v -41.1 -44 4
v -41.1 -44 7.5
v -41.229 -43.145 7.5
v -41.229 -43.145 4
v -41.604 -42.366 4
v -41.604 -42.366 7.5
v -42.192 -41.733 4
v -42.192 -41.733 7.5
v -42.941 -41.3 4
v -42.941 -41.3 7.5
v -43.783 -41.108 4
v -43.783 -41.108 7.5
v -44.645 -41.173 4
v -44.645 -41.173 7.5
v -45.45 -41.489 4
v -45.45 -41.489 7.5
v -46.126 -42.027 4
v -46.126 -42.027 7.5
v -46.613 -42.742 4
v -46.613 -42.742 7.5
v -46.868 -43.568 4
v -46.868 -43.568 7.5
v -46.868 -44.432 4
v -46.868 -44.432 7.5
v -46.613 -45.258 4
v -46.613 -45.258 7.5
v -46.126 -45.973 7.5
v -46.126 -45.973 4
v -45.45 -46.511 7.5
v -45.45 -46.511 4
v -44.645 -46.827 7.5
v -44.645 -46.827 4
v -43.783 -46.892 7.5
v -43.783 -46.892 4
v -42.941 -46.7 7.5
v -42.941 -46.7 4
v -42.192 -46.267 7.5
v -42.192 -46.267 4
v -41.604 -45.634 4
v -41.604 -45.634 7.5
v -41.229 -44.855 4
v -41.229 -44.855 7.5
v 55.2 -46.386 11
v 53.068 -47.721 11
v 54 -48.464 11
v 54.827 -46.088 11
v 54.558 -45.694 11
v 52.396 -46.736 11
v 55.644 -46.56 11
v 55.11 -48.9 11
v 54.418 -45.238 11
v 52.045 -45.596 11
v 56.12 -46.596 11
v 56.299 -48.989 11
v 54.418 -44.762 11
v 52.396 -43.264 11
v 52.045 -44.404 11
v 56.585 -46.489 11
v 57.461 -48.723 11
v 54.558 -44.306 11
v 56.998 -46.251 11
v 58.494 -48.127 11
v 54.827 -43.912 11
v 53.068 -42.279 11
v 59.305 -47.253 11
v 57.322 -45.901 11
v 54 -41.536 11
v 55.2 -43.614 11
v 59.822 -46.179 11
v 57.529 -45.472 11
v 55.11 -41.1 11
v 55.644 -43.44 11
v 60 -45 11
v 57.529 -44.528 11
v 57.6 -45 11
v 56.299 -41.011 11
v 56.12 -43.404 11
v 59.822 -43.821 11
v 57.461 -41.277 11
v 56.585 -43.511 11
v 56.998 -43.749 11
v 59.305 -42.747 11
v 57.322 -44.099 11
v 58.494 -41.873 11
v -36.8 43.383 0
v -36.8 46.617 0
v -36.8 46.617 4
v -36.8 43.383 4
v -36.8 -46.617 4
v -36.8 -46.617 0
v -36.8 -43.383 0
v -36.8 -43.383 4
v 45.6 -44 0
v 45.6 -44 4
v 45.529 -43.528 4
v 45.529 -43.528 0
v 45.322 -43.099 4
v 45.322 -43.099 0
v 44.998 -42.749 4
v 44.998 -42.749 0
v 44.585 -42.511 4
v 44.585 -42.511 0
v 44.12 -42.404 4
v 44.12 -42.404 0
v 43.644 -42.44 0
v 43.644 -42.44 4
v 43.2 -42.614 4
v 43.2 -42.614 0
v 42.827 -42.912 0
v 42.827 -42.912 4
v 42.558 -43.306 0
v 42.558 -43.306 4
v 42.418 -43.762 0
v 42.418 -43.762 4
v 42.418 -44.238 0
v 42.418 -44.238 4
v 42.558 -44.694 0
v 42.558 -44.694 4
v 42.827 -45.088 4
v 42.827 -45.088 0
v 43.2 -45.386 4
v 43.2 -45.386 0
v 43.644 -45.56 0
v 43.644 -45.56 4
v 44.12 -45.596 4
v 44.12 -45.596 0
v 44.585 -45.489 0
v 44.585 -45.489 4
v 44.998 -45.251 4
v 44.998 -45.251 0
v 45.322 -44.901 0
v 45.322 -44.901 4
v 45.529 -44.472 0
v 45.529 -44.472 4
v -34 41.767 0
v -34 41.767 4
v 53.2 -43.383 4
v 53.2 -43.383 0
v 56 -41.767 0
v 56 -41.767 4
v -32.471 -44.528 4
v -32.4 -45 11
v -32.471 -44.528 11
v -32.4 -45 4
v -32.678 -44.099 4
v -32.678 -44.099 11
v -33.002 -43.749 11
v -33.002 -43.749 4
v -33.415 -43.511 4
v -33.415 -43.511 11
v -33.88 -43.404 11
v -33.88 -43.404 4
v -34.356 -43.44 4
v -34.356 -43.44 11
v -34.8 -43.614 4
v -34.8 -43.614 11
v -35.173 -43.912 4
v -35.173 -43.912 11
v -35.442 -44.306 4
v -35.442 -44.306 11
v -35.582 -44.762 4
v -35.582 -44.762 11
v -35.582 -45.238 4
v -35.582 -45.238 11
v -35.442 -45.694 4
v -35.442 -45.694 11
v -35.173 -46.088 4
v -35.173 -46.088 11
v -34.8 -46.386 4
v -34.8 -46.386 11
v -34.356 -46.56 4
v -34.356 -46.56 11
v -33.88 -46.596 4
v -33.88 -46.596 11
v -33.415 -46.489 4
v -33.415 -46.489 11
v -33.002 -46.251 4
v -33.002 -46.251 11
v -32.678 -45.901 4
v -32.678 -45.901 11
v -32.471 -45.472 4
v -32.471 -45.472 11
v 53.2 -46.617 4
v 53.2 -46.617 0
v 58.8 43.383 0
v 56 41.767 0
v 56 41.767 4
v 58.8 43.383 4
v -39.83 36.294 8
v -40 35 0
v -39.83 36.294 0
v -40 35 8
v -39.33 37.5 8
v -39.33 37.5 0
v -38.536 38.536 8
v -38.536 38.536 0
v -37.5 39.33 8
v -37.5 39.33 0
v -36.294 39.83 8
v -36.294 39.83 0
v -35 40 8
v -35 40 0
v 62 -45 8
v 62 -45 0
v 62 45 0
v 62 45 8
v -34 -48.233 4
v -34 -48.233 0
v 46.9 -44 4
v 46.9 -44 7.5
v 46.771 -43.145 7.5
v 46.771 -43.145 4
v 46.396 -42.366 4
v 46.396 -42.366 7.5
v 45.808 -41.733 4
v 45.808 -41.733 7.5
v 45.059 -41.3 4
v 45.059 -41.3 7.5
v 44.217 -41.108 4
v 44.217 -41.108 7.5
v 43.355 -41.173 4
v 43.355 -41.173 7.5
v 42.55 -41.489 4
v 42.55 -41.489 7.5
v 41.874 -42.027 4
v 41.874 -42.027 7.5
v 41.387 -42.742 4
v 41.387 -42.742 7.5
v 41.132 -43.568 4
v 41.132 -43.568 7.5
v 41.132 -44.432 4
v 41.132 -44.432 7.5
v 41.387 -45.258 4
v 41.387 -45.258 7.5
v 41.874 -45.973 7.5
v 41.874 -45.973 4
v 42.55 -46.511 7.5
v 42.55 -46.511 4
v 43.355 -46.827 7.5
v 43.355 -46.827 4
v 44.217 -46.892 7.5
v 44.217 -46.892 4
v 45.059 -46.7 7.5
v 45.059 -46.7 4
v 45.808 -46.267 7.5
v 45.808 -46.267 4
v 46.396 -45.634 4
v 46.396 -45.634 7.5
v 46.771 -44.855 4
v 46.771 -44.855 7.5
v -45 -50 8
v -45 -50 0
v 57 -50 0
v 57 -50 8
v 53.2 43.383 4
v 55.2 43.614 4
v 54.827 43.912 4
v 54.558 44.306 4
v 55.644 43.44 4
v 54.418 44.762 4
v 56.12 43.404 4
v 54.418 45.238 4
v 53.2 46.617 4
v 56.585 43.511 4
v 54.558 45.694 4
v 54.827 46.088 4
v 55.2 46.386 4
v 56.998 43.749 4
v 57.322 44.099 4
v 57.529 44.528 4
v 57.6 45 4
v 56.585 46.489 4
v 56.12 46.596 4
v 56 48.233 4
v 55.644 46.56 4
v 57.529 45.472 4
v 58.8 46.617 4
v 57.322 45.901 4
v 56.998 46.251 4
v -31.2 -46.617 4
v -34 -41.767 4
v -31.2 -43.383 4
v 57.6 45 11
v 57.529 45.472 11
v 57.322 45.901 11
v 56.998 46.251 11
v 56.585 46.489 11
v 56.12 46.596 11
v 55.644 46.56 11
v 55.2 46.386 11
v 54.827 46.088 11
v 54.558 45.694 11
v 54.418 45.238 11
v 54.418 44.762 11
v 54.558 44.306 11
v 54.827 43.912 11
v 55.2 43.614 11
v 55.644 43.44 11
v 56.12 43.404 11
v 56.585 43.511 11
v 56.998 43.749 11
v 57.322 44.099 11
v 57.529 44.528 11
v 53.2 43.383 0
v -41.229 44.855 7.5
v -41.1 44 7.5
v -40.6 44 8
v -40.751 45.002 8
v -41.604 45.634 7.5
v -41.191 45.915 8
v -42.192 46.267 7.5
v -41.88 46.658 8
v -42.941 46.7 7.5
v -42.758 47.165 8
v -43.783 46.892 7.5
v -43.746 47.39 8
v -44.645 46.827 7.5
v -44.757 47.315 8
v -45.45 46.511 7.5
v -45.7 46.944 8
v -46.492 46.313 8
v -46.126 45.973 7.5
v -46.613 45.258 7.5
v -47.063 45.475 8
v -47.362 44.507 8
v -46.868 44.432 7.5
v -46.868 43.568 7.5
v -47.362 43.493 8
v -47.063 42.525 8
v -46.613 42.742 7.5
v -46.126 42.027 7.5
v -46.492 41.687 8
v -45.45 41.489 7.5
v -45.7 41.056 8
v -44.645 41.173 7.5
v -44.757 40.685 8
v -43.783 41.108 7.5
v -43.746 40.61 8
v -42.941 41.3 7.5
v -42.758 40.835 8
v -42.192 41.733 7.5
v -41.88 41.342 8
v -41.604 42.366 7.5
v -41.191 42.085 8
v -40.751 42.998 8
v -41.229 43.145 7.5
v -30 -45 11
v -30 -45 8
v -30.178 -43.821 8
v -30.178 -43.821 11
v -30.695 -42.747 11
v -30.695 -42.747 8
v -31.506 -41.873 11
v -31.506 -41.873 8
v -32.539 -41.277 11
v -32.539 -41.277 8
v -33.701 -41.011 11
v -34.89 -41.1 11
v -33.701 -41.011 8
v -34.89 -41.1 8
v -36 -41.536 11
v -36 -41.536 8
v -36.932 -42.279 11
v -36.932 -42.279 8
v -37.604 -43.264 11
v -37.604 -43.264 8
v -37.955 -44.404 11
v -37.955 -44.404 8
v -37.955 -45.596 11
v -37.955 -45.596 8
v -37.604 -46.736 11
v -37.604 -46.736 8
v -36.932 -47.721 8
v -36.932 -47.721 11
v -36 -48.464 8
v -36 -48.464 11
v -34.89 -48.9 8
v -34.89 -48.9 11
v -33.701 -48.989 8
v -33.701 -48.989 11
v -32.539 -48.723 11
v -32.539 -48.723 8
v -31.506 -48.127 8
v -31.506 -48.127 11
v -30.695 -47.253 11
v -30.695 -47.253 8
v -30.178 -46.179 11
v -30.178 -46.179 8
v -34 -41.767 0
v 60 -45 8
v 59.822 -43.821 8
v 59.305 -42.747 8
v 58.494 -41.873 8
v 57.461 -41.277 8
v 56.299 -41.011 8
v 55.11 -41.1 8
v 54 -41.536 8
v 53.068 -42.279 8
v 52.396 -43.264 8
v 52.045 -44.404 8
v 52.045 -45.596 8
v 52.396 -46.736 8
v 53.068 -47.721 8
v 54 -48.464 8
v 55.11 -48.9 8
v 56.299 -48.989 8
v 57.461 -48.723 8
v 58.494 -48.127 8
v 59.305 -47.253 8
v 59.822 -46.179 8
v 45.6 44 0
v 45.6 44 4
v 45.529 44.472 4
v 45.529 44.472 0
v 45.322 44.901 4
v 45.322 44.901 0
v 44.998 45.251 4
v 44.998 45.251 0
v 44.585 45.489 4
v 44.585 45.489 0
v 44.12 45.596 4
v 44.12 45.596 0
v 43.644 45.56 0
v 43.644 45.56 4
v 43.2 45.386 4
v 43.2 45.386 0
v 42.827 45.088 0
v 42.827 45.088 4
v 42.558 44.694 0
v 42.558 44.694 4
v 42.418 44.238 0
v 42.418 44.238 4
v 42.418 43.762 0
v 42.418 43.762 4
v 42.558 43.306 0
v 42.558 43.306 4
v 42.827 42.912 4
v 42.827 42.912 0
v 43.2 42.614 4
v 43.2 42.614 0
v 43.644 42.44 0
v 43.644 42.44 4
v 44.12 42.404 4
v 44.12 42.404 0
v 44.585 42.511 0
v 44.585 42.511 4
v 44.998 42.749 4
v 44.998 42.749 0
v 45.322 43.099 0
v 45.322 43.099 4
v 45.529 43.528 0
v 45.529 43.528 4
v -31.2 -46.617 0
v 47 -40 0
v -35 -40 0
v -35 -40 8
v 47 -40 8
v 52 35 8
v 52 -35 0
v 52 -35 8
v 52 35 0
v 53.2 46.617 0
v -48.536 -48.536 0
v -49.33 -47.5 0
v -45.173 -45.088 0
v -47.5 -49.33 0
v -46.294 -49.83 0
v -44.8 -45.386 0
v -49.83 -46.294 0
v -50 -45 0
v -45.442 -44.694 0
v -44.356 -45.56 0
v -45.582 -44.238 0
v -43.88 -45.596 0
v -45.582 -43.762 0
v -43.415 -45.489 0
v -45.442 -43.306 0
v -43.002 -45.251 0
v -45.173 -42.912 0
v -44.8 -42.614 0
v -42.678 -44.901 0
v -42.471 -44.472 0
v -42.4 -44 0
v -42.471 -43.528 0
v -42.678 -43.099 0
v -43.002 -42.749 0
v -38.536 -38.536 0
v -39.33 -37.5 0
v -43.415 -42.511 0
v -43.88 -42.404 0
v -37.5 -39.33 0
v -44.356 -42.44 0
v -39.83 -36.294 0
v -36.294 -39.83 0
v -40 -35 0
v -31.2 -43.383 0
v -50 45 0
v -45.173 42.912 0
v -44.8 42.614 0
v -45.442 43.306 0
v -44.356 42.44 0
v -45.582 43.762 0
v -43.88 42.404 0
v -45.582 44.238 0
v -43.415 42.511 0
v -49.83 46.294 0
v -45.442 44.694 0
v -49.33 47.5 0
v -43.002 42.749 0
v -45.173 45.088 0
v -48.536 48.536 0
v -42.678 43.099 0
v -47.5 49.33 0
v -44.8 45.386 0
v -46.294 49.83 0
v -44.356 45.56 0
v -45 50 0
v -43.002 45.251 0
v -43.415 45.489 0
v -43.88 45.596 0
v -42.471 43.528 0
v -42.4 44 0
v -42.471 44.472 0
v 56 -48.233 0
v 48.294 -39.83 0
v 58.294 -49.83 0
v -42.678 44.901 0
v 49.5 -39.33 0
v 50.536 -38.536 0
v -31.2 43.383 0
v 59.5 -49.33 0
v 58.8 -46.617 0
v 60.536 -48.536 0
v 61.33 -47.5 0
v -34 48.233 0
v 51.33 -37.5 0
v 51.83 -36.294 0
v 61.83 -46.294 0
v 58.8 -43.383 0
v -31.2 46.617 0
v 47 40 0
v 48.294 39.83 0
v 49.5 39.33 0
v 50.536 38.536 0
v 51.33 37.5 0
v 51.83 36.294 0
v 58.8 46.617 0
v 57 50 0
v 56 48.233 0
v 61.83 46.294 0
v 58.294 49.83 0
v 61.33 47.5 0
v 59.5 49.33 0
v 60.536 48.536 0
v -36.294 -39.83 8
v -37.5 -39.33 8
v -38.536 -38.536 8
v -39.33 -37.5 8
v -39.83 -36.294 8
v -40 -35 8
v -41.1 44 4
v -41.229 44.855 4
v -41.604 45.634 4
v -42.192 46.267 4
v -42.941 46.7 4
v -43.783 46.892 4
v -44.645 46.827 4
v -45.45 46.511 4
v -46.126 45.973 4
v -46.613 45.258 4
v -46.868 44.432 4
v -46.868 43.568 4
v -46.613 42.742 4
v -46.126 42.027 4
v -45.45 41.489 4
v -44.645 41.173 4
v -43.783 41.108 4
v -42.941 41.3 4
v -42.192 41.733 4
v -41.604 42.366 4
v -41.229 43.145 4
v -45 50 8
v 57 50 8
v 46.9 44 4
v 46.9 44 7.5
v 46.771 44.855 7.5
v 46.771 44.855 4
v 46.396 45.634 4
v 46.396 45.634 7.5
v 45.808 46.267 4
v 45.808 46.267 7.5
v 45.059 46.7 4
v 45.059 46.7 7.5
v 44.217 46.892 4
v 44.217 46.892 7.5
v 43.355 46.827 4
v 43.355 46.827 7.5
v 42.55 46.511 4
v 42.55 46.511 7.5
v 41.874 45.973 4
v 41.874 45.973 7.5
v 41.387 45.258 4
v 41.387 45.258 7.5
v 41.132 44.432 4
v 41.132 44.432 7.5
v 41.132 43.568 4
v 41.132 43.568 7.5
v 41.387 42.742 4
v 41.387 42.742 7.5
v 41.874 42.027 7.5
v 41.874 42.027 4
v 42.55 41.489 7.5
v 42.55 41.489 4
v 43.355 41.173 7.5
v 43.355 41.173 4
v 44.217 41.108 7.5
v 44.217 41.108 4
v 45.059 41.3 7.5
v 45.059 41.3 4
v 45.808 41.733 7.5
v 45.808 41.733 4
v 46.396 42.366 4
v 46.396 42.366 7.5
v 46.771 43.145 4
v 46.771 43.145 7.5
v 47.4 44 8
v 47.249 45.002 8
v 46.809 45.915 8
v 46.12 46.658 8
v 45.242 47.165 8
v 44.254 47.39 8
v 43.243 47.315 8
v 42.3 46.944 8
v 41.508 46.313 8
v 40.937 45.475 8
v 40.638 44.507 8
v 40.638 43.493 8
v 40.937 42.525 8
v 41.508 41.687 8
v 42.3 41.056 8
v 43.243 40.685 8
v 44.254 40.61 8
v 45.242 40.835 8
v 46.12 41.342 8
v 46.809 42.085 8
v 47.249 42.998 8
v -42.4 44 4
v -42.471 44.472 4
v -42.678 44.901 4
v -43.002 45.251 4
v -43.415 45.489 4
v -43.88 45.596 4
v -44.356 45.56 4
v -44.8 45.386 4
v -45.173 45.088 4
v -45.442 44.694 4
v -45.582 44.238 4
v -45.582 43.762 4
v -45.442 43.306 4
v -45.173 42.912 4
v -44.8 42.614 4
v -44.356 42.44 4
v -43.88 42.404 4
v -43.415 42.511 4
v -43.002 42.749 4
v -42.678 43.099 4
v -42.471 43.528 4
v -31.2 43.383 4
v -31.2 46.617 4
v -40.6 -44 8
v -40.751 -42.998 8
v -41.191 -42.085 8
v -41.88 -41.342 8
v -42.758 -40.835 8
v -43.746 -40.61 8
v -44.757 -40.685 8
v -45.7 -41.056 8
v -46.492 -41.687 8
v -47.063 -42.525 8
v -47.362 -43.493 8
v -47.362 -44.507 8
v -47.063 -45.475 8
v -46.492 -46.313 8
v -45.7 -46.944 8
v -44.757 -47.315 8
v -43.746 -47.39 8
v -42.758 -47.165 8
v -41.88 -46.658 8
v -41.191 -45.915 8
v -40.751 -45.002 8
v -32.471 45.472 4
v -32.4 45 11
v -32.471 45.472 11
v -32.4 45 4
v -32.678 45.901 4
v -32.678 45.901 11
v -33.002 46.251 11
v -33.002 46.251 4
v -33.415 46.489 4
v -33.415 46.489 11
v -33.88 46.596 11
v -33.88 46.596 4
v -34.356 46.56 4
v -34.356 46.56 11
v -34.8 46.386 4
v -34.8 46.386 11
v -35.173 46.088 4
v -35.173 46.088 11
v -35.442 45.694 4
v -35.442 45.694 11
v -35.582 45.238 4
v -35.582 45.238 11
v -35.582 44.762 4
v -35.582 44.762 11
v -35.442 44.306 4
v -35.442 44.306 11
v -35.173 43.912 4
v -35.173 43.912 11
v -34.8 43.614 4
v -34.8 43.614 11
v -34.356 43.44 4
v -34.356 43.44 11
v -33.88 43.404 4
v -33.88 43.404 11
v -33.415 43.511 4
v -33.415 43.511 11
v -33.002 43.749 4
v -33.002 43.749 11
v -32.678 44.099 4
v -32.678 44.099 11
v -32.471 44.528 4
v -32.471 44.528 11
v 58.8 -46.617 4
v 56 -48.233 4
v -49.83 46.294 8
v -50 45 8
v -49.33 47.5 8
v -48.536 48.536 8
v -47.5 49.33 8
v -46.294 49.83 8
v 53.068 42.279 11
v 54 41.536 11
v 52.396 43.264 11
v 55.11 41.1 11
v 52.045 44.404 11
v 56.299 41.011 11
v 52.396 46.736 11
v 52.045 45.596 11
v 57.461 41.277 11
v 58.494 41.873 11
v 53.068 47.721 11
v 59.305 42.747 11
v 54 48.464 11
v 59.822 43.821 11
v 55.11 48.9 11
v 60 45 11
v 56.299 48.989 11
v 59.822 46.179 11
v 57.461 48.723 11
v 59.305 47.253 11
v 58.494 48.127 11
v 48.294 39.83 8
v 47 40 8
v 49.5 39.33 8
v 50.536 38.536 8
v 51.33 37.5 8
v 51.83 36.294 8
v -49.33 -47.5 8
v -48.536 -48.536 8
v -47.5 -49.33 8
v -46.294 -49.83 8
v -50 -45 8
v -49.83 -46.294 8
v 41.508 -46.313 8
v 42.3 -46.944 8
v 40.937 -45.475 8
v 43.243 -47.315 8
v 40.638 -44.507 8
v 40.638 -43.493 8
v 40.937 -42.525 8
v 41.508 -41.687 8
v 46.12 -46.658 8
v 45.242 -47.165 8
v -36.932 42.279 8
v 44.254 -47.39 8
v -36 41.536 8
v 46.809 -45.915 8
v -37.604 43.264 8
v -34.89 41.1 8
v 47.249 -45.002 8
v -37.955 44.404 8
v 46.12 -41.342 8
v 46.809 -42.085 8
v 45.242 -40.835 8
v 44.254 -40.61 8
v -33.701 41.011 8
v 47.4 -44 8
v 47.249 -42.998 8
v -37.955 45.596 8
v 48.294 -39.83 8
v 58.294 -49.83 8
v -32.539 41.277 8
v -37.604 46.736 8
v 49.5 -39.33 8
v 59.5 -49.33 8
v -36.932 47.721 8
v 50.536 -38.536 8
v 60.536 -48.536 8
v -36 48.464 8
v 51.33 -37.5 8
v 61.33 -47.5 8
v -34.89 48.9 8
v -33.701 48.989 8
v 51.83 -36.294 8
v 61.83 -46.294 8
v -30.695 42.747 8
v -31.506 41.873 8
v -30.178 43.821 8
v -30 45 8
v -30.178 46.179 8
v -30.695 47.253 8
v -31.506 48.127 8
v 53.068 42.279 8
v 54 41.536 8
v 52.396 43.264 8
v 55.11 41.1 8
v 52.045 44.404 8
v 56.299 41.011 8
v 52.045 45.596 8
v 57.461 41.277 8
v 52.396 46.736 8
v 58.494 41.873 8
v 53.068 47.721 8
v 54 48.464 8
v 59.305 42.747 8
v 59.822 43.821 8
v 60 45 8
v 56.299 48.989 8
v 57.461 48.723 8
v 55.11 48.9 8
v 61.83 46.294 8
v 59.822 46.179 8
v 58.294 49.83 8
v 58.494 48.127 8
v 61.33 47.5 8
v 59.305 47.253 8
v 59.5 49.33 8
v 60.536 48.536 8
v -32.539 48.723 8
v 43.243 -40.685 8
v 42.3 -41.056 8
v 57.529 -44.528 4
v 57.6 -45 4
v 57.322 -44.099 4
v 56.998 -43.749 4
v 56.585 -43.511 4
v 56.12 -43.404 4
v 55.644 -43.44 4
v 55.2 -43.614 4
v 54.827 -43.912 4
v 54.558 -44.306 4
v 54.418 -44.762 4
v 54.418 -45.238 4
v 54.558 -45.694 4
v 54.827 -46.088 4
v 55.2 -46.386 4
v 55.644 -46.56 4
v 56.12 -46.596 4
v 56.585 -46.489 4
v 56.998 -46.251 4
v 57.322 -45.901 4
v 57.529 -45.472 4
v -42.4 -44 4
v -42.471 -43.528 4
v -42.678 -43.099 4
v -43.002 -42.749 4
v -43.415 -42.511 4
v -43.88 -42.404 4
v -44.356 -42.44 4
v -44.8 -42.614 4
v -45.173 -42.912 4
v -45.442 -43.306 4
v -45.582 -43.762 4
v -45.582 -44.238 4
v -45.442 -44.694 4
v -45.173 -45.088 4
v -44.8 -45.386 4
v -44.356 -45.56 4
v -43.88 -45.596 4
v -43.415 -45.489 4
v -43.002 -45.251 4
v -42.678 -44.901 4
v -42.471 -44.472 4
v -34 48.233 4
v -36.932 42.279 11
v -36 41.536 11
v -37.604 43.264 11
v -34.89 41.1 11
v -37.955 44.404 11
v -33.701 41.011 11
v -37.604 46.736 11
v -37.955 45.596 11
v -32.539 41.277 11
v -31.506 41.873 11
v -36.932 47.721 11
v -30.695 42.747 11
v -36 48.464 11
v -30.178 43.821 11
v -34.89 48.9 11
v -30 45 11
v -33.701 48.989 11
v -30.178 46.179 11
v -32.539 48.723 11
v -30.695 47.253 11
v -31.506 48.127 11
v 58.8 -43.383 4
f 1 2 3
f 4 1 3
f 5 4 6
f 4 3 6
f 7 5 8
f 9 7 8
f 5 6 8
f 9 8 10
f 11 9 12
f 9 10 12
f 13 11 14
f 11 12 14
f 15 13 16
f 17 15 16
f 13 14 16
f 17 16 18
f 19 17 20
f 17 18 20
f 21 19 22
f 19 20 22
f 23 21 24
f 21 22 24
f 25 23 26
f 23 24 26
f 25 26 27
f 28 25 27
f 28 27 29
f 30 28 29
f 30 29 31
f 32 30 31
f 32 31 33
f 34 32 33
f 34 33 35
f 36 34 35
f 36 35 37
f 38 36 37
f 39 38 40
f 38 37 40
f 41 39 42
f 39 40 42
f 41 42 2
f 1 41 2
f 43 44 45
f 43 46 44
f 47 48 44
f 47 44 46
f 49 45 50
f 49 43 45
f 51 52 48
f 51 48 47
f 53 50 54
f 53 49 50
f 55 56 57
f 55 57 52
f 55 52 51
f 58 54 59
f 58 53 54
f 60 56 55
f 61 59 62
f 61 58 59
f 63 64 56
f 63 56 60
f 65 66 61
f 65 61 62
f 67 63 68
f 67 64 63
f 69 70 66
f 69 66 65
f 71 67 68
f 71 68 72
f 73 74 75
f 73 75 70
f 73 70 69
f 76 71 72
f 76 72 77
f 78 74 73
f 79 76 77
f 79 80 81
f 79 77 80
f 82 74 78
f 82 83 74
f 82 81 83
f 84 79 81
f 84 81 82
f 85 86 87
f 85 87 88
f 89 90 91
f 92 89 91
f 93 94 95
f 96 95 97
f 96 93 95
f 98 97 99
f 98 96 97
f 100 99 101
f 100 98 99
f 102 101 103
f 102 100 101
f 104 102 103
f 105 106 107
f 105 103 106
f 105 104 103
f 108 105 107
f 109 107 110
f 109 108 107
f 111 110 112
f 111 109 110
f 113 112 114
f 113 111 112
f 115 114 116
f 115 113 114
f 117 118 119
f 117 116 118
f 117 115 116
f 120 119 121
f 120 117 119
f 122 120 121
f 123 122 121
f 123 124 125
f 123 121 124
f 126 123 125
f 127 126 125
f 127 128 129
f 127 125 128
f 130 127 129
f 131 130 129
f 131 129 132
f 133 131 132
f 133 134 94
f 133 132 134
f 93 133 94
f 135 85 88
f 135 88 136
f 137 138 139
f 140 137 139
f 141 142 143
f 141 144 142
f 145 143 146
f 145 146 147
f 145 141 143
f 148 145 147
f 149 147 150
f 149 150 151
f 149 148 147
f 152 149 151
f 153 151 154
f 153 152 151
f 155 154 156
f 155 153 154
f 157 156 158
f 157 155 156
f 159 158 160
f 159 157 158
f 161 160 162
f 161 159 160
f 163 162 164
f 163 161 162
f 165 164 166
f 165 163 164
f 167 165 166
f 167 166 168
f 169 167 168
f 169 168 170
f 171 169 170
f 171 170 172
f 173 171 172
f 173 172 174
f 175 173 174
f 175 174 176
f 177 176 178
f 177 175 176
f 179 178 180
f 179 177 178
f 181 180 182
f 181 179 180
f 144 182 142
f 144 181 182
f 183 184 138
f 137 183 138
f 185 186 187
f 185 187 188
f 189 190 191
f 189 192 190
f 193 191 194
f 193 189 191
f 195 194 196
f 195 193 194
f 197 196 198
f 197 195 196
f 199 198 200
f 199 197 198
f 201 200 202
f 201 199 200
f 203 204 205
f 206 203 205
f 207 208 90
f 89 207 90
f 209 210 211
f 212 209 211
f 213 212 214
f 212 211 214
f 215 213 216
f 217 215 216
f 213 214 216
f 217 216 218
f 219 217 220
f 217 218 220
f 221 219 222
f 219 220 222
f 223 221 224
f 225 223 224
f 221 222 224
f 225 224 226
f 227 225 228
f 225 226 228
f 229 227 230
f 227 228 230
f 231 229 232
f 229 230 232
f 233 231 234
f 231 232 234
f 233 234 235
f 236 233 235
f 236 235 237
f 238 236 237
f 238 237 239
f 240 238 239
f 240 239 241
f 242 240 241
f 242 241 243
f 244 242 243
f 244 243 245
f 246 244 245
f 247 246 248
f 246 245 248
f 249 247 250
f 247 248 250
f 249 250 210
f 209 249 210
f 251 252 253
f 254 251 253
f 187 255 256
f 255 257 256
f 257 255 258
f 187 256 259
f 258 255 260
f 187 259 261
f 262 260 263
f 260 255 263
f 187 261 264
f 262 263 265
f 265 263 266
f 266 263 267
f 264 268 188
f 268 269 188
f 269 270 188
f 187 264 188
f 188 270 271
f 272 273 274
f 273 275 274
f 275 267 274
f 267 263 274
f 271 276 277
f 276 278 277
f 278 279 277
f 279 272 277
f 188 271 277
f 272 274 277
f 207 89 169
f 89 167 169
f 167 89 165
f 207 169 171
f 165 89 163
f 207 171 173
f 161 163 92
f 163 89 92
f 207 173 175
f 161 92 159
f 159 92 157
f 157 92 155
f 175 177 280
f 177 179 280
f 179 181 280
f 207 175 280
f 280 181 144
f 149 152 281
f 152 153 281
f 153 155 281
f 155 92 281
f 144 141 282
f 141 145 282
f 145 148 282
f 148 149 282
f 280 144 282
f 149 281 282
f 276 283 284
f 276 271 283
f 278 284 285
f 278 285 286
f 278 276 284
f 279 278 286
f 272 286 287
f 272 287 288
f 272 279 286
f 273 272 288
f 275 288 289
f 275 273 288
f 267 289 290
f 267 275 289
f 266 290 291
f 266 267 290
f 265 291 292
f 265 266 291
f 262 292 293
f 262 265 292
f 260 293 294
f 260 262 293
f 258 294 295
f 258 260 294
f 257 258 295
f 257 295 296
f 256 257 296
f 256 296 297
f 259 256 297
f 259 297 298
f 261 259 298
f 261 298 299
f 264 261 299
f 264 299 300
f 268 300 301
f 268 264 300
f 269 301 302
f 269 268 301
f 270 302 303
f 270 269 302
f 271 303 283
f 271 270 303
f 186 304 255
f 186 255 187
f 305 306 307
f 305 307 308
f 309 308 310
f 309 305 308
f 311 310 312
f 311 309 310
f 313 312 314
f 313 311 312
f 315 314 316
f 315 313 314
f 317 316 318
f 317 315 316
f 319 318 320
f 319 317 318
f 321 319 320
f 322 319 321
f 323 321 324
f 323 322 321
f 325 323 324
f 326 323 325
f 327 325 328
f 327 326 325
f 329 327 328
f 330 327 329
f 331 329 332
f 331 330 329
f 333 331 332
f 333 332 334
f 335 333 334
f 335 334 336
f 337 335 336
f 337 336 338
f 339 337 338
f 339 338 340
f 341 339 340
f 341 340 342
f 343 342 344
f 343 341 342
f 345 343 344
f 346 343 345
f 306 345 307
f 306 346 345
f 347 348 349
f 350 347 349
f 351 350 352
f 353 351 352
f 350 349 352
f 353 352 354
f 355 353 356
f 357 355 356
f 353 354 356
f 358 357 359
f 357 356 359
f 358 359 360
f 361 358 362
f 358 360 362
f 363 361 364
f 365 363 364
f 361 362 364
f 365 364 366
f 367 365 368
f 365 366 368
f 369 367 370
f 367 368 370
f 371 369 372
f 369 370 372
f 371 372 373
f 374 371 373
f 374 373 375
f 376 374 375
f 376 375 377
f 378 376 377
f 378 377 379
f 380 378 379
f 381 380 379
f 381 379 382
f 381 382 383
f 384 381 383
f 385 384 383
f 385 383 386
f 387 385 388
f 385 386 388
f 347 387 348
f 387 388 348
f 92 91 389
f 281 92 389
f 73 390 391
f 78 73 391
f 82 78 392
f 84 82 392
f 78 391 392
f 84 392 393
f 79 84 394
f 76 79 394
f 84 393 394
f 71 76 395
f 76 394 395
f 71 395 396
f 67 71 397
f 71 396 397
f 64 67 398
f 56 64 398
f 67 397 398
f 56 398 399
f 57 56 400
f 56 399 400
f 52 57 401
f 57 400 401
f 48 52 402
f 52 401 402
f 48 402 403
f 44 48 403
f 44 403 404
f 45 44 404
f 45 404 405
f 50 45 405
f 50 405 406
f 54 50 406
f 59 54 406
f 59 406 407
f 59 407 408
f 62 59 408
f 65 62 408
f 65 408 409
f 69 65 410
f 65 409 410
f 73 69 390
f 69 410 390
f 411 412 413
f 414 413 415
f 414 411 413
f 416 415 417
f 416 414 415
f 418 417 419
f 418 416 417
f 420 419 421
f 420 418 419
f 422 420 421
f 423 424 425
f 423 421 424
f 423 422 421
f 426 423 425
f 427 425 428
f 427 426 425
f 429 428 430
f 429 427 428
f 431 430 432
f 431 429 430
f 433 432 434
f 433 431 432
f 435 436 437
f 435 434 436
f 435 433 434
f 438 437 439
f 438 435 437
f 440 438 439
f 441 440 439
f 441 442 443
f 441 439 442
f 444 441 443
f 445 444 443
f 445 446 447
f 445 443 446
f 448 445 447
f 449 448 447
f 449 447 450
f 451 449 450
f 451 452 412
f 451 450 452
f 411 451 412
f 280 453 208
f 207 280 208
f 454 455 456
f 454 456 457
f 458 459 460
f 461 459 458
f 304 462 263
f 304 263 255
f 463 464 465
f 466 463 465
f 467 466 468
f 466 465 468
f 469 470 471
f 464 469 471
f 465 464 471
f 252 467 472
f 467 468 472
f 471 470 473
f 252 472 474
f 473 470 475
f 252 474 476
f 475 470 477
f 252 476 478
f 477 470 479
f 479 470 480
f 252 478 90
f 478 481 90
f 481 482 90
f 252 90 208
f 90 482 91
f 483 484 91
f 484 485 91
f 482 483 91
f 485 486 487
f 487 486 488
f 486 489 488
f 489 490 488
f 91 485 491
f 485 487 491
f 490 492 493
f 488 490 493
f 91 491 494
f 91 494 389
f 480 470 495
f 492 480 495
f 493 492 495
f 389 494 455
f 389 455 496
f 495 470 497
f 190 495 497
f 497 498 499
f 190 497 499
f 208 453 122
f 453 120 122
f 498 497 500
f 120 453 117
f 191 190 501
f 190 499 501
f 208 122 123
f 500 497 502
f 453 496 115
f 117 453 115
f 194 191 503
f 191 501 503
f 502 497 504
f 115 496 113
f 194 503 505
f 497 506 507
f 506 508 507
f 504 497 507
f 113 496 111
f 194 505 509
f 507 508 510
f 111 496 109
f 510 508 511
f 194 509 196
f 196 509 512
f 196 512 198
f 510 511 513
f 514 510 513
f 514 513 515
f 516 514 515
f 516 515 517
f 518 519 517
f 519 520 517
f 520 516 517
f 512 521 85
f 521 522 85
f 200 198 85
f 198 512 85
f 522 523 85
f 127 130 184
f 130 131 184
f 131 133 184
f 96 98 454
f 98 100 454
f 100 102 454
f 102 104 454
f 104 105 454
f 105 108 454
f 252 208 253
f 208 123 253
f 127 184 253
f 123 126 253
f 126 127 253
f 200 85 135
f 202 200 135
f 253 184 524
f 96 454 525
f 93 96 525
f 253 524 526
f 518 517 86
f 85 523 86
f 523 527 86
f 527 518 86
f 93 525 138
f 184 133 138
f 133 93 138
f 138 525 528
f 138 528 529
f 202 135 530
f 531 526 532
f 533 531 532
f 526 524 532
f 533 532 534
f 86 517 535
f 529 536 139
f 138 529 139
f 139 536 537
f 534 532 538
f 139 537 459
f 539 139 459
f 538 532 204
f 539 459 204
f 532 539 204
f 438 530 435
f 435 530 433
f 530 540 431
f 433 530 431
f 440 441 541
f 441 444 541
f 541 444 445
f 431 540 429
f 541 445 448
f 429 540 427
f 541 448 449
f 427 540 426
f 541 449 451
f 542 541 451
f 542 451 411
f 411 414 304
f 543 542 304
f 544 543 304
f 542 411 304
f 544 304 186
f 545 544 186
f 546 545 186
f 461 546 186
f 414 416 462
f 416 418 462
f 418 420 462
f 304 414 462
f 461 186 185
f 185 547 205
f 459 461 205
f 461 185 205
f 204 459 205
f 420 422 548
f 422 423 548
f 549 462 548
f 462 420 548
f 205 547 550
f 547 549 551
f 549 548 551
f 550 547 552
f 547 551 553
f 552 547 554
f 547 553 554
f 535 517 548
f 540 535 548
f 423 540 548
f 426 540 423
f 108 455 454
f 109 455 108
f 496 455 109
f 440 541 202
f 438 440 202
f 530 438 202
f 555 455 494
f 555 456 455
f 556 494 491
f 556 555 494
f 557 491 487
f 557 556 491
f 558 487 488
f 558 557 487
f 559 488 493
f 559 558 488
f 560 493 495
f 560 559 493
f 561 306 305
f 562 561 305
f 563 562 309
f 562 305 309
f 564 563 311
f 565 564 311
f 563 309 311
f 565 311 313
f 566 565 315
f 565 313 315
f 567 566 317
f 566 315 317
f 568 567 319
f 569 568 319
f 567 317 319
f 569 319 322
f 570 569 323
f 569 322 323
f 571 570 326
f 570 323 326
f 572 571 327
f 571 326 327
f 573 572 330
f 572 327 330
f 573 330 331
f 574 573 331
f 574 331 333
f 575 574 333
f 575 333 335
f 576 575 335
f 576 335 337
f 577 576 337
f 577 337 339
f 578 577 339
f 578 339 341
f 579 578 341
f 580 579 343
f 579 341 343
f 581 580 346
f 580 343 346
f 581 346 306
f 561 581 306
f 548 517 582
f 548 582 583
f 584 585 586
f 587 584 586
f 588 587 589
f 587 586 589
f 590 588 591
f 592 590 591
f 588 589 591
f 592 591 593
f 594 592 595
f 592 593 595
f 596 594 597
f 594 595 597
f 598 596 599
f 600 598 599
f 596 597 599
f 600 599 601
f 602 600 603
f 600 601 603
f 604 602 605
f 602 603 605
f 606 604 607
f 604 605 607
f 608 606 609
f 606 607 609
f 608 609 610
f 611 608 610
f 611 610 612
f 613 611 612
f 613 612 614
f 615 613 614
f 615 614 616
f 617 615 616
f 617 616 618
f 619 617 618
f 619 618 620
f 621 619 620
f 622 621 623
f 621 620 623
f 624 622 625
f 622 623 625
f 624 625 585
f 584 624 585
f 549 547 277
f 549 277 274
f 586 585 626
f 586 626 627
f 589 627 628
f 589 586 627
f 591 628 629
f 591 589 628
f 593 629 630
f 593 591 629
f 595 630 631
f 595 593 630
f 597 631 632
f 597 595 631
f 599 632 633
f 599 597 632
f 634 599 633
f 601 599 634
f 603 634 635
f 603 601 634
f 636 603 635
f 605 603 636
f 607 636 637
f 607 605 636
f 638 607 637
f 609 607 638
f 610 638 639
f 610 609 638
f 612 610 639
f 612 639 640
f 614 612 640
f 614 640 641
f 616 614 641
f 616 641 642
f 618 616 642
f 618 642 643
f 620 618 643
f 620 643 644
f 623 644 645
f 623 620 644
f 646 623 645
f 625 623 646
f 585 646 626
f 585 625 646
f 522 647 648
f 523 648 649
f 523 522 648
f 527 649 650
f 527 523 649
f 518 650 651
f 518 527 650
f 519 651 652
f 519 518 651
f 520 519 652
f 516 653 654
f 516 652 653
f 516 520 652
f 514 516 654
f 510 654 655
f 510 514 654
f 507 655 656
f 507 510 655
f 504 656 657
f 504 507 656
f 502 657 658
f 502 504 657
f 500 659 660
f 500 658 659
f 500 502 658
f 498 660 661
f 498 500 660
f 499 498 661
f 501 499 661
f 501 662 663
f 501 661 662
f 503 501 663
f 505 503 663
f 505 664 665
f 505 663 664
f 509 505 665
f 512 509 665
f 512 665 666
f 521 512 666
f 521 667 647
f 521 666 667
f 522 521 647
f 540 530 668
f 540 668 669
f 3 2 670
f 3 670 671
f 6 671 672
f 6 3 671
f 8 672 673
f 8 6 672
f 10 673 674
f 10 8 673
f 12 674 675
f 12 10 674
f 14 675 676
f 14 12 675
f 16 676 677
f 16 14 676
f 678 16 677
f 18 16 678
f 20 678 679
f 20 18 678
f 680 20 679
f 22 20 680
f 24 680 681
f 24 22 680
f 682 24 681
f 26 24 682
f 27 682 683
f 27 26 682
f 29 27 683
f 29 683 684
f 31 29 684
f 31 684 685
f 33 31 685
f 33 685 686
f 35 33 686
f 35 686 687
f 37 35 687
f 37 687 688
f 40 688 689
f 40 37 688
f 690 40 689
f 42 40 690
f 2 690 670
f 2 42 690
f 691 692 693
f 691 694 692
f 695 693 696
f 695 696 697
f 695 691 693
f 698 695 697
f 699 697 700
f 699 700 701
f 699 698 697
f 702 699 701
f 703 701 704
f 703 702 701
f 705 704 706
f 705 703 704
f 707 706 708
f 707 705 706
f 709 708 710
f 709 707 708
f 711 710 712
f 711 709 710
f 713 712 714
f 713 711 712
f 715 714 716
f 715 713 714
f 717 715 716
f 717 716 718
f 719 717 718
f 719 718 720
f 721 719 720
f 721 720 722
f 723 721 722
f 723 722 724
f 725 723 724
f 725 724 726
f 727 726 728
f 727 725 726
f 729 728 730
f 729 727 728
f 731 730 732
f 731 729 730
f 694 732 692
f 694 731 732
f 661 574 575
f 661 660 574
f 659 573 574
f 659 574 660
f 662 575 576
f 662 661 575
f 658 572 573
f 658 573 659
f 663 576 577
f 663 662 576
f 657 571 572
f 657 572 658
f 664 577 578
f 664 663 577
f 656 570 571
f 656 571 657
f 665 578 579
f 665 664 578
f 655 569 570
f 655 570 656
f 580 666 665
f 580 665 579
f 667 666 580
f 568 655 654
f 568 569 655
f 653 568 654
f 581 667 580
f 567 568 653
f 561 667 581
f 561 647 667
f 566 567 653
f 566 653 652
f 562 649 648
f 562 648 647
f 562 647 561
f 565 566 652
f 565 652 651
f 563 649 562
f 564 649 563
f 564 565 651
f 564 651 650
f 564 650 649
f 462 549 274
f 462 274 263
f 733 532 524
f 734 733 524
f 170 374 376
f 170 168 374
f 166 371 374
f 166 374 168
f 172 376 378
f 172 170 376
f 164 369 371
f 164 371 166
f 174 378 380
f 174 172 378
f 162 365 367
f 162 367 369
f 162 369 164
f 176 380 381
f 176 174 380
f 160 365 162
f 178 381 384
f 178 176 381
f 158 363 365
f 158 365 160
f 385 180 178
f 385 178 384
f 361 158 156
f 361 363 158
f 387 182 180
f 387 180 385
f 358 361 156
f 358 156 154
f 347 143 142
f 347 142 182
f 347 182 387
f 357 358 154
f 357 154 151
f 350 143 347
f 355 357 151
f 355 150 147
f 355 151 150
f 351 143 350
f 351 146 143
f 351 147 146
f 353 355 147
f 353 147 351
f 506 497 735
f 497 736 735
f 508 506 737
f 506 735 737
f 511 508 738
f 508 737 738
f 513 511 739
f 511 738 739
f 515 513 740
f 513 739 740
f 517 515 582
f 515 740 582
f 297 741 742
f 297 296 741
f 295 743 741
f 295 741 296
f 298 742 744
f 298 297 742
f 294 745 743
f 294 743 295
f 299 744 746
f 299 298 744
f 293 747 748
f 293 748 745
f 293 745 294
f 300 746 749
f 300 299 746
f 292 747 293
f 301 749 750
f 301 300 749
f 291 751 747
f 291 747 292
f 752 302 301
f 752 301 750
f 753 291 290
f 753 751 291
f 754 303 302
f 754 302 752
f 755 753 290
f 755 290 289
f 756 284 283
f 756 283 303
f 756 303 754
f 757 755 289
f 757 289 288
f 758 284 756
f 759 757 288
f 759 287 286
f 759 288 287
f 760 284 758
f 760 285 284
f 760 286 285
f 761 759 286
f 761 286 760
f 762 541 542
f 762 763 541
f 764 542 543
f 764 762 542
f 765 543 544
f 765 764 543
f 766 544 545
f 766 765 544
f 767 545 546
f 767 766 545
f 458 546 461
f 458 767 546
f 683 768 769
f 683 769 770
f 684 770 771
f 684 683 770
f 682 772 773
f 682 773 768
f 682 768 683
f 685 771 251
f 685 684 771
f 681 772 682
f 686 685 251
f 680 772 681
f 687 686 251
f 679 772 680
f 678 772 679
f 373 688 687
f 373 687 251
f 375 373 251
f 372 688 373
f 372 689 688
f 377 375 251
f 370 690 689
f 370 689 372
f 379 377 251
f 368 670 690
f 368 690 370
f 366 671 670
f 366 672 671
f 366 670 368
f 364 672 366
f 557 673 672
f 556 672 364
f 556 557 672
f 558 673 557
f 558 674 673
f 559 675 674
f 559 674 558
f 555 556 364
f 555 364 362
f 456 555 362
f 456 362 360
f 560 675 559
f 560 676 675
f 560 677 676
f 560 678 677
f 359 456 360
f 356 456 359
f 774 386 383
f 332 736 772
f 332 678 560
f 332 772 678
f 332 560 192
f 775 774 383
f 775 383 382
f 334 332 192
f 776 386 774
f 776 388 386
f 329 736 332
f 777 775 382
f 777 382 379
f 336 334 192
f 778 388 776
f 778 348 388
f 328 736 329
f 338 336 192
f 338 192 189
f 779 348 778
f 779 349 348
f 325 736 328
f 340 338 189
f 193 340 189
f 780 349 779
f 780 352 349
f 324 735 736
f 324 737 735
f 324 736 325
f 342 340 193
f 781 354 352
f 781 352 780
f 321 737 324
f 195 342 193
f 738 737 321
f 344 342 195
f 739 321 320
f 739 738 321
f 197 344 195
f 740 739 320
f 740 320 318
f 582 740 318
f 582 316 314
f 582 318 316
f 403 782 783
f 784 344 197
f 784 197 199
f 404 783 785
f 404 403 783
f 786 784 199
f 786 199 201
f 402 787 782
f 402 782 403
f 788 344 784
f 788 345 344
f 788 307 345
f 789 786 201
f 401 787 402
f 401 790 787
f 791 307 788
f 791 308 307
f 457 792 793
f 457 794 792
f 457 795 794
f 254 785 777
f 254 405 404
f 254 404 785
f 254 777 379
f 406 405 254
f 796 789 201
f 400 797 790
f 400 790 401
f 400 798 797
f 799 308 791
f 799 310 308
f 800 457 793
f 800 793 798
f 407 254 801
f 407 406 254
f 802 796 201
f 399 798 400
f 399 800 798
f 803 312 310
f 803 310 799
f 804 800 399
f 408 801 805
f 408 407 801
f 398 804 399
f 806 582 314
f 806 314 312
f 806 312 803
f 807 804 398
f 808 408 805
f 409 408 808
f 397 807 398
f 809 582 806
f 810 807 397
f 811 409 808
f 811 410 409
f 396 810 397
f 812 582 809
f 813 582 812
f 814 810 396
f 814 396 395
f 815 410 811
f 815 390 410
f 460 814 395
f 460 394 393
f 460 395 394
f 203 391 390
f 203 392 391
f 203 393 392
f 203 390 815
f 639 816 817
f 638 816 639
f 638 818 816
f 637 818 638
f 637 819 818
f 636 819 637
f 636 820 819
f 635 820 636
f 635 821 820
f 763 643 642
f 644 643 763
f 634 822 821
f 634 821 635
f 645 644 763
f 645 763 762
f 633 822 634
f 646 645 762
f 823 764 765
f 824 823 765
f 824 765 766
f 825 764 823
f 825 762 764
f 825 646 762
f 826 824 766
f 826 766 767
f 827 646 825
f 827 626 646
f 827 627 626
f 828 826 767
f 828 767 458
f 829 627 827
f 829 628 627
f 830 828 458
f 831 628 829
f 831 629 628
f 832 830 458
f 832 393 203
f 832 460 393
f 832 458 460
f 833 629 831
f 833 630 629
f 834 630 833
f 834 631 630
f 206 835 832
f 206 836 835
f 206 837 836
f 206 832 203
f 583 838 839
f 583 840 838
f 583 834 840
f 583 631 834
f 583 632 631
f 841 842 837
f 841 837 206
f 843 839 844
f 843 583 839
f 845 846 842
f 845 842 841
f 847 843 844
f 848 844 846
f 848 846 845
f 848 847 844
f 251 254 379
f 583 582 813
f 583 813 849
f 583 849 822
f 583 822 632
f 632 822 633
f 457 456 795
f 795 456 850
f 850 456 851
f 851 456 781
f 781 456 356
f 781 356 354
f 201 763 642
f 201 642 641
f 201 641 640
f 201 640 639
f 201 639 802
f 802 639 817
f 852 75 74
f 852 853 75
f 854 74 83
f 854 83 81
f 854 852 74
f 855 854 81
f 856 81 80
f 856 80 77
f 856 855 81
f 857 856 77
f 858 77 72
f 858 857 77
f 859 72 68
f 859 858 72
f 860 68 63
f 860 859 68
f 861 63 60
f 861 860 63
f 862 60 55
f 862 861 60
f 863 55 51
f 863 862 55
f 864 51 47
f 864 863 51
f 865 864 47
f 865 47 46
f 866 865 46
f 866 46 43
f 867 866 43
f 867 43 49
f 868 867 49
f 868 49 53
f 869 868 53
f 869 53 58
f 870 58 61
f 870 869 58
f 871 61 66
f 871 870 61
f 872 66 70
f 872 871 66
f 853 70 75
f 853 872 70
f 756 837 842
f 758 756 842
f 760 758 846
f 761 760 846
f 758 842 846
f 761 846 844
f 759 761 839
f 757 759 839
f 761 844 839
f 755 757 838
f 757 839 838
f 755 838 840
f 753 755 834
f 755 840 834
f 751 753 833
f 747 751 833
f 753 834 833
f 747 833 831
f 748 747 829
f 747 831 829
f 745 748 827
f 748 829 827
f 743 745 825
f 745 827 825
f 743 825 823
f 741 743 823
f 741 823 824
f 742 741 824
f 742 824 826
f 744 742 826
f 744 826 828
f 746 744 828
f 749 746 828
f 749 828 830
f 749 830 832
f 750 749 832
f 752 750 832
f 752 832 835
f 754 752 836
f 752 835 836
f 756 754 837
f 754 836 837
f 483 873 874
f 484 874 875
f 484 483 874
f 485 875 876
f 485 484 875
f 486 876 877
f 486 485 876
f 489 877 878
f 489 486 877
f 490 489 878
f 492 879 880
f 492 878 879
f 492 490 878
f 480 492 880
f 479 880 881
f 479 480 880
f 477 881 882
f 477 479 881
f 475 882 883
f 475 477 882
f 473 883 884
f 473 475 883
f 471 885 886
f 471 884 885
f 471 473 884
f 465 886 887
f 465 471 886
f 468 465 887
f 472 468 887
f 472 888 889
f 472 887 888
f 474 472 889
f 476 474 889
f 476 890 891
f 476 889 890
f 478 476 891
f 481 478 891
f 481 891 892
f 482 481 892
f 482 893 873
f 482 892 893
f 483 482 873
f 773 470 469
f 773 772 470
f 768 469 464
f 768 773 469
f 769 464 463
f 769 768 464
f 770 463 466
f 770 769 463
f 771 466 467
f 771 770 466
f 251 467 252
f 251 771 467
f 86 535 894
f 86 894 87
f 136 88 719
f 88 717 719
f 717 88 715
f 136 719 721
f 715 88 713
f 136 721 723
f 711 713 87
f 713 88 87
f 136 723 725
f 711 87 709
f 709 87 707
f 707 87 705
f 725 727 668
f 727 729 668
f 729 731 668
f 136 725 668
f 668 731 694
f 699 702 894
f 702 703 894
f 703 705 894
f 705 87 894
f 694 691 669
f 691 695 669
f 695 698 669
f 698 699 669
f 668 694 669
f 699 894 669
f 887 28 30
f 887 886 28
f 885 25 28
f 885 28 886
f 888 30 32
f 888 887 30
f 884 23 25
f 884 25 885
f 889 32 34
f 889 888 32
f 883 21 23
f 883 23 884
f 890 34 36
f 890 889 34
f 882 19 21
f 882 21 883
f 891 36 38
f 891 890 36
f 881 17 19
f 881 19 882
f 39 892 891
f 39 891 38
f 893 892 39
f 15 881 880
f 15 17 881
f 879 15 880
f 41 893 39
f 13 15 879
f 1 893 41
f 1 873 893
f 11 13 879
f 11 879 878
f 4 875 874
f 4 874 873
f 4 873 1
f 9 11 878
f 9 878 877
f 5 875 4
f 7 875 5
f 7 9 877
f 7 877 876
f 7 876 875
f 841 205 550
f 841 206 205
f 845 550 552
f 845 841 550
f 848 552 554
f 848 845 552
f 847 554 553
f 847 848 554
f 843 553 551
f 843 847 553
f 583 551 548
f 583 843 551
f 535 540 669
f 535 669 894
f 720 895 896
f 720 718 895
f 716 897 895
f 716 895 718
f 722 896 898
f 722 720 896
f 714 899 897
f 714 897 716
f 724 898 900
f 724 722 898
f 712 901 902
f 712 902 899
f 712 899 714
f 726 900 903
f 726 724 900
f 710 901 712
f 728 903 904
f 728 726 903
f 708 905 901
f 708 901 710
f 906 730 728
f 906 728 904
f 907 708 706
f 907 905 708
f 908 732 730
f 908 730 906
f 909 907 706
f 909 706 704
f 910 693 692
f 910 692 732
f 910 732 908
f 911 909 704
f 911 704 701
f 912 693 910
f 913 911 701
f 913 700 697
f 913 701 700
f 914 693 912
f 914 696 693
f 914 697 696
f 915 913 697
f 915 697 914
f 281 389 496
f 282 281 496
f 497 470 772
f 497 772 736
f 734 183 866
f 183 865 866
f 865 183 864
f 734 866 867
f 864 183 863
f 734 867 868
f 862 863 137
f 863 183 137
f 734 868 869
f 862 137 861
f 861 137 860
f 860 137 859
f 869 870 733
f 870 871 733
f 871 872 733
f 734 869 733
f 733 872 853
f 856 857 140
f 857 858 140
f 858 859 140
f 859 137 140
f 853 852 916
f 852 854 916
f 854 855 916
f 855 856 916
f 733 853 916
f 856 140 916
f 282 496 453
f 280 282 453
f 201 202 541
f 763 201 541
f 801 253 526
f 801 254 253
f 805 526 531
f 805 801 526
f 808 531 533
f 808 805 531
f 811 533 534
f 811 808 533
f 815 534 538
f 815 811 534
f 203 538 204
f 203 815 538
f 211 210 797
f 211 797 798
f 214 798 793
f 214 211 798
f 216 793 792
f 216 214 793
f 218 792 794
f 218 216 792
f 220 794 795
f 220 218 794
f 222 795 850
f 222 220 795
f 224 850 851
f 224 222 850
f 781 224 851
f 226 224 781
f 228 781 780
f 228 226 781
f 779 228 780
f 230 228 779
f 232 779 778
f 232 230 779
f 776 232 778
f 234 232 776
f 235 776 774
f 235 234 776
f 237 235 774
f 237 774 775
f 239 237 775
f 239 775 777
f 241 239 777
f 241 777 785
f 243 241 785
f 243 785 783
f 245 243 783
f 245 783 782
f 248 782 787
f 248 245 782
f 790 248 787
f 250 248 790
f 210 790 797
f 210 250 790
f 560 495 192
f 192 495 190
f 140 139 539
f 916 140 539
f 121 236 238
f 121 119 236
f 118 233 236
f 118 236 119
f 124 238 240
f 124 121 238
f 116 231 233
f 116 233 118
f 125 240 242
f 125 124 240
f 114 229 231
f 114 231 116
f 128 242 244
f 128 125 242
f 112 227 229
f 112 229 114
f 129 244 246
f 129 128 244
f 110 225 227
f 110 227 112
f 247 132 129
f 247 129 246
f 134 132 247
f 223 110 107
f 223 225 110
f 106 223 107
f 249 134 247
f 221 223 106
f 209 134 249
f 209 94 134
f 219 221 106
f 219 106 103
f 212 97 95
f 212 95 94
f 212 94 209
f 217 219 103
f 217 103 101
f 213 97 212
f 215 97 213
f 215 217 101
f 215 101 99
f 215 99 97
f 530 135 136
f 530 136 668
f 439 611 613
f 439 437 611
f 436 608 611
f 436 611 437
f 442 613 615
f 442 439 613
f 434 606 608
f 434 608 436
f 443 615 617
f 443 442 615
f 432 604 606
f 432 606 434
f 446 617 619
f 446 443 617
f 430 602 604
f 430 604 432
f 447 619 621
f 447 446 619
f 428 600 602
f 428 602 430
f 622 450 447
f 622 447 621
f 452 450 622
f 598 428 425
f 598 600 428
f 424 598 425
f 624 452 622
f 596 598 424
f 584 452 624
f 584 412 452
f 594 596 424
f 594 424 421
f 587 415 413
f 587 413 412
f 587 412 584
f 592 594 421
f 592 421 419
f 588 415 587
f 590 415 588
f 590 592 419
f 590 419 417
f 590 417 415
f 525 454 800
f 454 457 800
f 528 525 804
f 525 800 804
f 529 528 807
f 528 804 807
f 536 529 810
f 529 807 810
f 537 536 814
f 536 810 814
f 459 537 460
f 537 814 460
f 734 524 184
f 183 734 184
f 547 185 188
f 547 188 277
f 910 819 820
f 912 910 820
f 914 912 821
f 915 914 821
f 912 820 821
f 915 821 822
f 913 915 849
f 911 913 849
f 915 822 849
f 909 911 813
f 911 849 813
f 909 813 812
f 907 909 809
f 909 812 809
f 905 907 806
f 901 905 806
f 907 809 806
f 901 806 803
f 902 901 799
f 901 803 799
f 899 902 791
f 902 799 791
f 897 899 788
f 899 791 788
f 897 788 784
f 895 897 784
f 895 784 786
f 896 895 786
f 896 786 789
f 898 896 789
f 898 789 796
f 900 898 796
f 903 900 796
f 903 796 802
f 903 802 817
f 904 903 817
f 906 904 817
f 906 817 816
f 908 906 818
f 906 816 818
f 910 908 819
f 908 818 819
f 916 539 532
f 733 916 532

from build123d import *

# Parameters (mm, degrees)
SKICA1_W                 = 112
SKICA1_H                 = 100
SKICA1_R                 = 1.6
SKICA1_W_2               = 92
SKICA1_H_2               = 80
P_IDAT_VYSUNUT_M1_DEPTH  = 8
SKICA2_R                 = 2.9
ODEBRAT_VYSUNUT_M1_DEPTH = 4
SKICA3_R                 = 1.6
P_IDAT_VYSUNUT_M2_DEPTH  = 4
ZKOSEN_1_SIZE            = 0.5
ZAOBLIT1_R               = 5
SKICA4_R                 = 4
SKICA4_R_2               = 1.6
P_IDAT_VYSUNUT_M3_DEPTH  = 3


with BuildPart() as part:
    # Skica1 → Přidat vysunutím1 (new body)
    with BuildSketch(Plane.XY):
        with Locations((6, 0)):
            Rectangle(SKICA1_W, SKICA1_H)
        with Locations((-44, 44)):
            Circle(SKICA1_R, mode=Mode.SUBTRACT)
        with Locations((44, 44)):
            Circle(SKICA1_R, mode=Mode.SUBTRACT)
        with Locations((-44, -44)):
            Circle(SKICA1_R, mode=Mode.SUBTRACT)
        with Locations((44, -44)):
            Circle(SKICA1_R, mode=Mode.SUBTRACT)
        Polygon((-34, 41.766838493), (-31.2, 43.383419246), (-31.2, 46.616580754), (-34, 48.233161507), (-36.8, 46.616580754), (-36.8, 43.383419246), align=None, mode=Mode.SUBTRACT)
        Polygon((56, 41.766838493), (58.8, 43.383419246), (58.8, 46.616580754), (56, 48.233161507), (53.2, 46.616580754), (53.2, 43.383419246), align=None, mode=Mode.SUBTRACT)
        Polygon((53.2, -43.383419246), (56, -41.766838493), (58.8, -43.383419246), (58.8, -46.616580754), (56, -48.233161507), (53.2, -46.616580754), align=None, mode=Mode.SUBTRACT)
        Polygon((-36.8, -43.383419246), (-34, -41.766838493), (-31.2, -43.383419246), (-31.2, -46.616580754), (-34, -48.233161507), (-36.8, -46.616580754), align=None, mode=Mode.SUBTRACT)
        with Locations((6, 0)):
            Rectangle(SKICA1_W_2, SKICA1_H_2, mode=Mode.SUBTRACT)
    extrude(amount=P_IDAT_VYSUNUT_M1_DEPTH)

    # Skica2 → Odebrat vysunutím1 (cut)
    with BuildSketch(Plane.XY.offset(8)):
        with Locations((-44, 44)):
            Circle(SKICA2_R)
        with Locations((44, 44)):
            Circle(SKICA2_R)
        with Locations((44, -44)):
            Circle(SKICA2_R)
        with Locations((-44, -44)):
            Circle(SKICA2_R)
    extrude(amount=-ODEBRAT_VYSUNUT_M1_DEPTH, mode=Mode.SUBTRACT)

    # Skica3 → Přidat vysunutím2 (add)
    with BuildSketch(Plane.XY.offset(8)):
        Polygon((-31.2, -46.616580754), (-31.2, -43.383419246), (-34, -41.766838493), (-36.8, -43.383419246), (-36.8, -46.616580754), (-34, -48.233161507), align=None)
        with Locations((-34, -45)):
            Circle(SKICA3_R, mode=Mode.SUBTRACT)
        Polygon((58.8, -46.616580754), (58.8, -43.383419246), (56, -41.766838493), (53.2, -43.383419246), (53.2, -46.616580754), (56, -48.233161507), align=None)
        with Locations((56, -45)):
            Circle(SKICA3_R, mode=Mode.SUBTRACT)
        Polygon((53.2, 46.616580754), (53.2, 43.383419246), (56, 41.766838493), (58.8, 43.383419246), (58.8, 46.616580754), (56, 48.233161507), align=None)
        with Locations((56, 45)):
            Circle(SKICA3_R, mode=Mode.SUBTRACT)
        Polygon((-34, 48.233161507), (-36.8, 46.616580754), (-36.8, 43.383419246), (-34, 41.766838493), (-31.2, 43.383419246), (-31.2, 46.616580754), align=None)
        with Locations((-34, 45)):
            Circle(SKICA3_R, mode=Mode.SUBTRACT)
    extrude(amount=-P_IDAT_VYSUNUT_M2_DEPTH)

    # Zkosení1
    zkosen_1_edges = [part.edges().sort_by_distance(p)[0] for p in [
        (-46.9, -44, 8),
        (41.1, -44, 8),
        (41.1, 44, 8),
        (-46.9, 44, 8),
    ]]
    chamfer(zkosen_1_edges, length=ZKOSEN_1_SIZE)

    # Zaoblit1
    zaoblit1_edges = [part.edges().sort_by_distance(p)[0] for p in [
        (-40, 40, 4),
        (-40, -40, 4),
        (52, -40, 4),
        (52, 40, 4),
        (-50, 50, 4),
        (62, 50, 4),
        (62, -50, 4),
        (-50, -50, 4),
    ]]
    fillet(zaoblit1_edges, radius=ZAOBLIT1_R)

    # Skica4 → Přidat vysunutím3 (add)
    with BuildSketch(Plane.XY.offset(8)):
        with Locations((-34, 45)):
            Circle(SKICA4_R)
        with Locations((-34, 45)):
            Circle(SKICA4_R_2, mode=Mode.SUBTRACT)
        with Locations((56, 45)):
            Circle(SKICA4_R)
        with Locations((56, 45)):
            Circle(SKICA4_R_2, mode=Mode.SUBTRACT)
        with Locations((56, -45)):
            Circle(SKICA4_R)
        with Locations((56, -45)):
            Circle(SKICA4_R_2, mode=Mode.SUBTRACT)
        with Locations((-34, -45)):
            Circle(SKICA4_R)
        with Locations((-34, -45)):
            Circle(SKICA4_R_2, mode=Mode.SUBTRACT)
    extrude(amount=P_IDAT_VYSUNUT_M3_DEPTH)


solid = part.part
